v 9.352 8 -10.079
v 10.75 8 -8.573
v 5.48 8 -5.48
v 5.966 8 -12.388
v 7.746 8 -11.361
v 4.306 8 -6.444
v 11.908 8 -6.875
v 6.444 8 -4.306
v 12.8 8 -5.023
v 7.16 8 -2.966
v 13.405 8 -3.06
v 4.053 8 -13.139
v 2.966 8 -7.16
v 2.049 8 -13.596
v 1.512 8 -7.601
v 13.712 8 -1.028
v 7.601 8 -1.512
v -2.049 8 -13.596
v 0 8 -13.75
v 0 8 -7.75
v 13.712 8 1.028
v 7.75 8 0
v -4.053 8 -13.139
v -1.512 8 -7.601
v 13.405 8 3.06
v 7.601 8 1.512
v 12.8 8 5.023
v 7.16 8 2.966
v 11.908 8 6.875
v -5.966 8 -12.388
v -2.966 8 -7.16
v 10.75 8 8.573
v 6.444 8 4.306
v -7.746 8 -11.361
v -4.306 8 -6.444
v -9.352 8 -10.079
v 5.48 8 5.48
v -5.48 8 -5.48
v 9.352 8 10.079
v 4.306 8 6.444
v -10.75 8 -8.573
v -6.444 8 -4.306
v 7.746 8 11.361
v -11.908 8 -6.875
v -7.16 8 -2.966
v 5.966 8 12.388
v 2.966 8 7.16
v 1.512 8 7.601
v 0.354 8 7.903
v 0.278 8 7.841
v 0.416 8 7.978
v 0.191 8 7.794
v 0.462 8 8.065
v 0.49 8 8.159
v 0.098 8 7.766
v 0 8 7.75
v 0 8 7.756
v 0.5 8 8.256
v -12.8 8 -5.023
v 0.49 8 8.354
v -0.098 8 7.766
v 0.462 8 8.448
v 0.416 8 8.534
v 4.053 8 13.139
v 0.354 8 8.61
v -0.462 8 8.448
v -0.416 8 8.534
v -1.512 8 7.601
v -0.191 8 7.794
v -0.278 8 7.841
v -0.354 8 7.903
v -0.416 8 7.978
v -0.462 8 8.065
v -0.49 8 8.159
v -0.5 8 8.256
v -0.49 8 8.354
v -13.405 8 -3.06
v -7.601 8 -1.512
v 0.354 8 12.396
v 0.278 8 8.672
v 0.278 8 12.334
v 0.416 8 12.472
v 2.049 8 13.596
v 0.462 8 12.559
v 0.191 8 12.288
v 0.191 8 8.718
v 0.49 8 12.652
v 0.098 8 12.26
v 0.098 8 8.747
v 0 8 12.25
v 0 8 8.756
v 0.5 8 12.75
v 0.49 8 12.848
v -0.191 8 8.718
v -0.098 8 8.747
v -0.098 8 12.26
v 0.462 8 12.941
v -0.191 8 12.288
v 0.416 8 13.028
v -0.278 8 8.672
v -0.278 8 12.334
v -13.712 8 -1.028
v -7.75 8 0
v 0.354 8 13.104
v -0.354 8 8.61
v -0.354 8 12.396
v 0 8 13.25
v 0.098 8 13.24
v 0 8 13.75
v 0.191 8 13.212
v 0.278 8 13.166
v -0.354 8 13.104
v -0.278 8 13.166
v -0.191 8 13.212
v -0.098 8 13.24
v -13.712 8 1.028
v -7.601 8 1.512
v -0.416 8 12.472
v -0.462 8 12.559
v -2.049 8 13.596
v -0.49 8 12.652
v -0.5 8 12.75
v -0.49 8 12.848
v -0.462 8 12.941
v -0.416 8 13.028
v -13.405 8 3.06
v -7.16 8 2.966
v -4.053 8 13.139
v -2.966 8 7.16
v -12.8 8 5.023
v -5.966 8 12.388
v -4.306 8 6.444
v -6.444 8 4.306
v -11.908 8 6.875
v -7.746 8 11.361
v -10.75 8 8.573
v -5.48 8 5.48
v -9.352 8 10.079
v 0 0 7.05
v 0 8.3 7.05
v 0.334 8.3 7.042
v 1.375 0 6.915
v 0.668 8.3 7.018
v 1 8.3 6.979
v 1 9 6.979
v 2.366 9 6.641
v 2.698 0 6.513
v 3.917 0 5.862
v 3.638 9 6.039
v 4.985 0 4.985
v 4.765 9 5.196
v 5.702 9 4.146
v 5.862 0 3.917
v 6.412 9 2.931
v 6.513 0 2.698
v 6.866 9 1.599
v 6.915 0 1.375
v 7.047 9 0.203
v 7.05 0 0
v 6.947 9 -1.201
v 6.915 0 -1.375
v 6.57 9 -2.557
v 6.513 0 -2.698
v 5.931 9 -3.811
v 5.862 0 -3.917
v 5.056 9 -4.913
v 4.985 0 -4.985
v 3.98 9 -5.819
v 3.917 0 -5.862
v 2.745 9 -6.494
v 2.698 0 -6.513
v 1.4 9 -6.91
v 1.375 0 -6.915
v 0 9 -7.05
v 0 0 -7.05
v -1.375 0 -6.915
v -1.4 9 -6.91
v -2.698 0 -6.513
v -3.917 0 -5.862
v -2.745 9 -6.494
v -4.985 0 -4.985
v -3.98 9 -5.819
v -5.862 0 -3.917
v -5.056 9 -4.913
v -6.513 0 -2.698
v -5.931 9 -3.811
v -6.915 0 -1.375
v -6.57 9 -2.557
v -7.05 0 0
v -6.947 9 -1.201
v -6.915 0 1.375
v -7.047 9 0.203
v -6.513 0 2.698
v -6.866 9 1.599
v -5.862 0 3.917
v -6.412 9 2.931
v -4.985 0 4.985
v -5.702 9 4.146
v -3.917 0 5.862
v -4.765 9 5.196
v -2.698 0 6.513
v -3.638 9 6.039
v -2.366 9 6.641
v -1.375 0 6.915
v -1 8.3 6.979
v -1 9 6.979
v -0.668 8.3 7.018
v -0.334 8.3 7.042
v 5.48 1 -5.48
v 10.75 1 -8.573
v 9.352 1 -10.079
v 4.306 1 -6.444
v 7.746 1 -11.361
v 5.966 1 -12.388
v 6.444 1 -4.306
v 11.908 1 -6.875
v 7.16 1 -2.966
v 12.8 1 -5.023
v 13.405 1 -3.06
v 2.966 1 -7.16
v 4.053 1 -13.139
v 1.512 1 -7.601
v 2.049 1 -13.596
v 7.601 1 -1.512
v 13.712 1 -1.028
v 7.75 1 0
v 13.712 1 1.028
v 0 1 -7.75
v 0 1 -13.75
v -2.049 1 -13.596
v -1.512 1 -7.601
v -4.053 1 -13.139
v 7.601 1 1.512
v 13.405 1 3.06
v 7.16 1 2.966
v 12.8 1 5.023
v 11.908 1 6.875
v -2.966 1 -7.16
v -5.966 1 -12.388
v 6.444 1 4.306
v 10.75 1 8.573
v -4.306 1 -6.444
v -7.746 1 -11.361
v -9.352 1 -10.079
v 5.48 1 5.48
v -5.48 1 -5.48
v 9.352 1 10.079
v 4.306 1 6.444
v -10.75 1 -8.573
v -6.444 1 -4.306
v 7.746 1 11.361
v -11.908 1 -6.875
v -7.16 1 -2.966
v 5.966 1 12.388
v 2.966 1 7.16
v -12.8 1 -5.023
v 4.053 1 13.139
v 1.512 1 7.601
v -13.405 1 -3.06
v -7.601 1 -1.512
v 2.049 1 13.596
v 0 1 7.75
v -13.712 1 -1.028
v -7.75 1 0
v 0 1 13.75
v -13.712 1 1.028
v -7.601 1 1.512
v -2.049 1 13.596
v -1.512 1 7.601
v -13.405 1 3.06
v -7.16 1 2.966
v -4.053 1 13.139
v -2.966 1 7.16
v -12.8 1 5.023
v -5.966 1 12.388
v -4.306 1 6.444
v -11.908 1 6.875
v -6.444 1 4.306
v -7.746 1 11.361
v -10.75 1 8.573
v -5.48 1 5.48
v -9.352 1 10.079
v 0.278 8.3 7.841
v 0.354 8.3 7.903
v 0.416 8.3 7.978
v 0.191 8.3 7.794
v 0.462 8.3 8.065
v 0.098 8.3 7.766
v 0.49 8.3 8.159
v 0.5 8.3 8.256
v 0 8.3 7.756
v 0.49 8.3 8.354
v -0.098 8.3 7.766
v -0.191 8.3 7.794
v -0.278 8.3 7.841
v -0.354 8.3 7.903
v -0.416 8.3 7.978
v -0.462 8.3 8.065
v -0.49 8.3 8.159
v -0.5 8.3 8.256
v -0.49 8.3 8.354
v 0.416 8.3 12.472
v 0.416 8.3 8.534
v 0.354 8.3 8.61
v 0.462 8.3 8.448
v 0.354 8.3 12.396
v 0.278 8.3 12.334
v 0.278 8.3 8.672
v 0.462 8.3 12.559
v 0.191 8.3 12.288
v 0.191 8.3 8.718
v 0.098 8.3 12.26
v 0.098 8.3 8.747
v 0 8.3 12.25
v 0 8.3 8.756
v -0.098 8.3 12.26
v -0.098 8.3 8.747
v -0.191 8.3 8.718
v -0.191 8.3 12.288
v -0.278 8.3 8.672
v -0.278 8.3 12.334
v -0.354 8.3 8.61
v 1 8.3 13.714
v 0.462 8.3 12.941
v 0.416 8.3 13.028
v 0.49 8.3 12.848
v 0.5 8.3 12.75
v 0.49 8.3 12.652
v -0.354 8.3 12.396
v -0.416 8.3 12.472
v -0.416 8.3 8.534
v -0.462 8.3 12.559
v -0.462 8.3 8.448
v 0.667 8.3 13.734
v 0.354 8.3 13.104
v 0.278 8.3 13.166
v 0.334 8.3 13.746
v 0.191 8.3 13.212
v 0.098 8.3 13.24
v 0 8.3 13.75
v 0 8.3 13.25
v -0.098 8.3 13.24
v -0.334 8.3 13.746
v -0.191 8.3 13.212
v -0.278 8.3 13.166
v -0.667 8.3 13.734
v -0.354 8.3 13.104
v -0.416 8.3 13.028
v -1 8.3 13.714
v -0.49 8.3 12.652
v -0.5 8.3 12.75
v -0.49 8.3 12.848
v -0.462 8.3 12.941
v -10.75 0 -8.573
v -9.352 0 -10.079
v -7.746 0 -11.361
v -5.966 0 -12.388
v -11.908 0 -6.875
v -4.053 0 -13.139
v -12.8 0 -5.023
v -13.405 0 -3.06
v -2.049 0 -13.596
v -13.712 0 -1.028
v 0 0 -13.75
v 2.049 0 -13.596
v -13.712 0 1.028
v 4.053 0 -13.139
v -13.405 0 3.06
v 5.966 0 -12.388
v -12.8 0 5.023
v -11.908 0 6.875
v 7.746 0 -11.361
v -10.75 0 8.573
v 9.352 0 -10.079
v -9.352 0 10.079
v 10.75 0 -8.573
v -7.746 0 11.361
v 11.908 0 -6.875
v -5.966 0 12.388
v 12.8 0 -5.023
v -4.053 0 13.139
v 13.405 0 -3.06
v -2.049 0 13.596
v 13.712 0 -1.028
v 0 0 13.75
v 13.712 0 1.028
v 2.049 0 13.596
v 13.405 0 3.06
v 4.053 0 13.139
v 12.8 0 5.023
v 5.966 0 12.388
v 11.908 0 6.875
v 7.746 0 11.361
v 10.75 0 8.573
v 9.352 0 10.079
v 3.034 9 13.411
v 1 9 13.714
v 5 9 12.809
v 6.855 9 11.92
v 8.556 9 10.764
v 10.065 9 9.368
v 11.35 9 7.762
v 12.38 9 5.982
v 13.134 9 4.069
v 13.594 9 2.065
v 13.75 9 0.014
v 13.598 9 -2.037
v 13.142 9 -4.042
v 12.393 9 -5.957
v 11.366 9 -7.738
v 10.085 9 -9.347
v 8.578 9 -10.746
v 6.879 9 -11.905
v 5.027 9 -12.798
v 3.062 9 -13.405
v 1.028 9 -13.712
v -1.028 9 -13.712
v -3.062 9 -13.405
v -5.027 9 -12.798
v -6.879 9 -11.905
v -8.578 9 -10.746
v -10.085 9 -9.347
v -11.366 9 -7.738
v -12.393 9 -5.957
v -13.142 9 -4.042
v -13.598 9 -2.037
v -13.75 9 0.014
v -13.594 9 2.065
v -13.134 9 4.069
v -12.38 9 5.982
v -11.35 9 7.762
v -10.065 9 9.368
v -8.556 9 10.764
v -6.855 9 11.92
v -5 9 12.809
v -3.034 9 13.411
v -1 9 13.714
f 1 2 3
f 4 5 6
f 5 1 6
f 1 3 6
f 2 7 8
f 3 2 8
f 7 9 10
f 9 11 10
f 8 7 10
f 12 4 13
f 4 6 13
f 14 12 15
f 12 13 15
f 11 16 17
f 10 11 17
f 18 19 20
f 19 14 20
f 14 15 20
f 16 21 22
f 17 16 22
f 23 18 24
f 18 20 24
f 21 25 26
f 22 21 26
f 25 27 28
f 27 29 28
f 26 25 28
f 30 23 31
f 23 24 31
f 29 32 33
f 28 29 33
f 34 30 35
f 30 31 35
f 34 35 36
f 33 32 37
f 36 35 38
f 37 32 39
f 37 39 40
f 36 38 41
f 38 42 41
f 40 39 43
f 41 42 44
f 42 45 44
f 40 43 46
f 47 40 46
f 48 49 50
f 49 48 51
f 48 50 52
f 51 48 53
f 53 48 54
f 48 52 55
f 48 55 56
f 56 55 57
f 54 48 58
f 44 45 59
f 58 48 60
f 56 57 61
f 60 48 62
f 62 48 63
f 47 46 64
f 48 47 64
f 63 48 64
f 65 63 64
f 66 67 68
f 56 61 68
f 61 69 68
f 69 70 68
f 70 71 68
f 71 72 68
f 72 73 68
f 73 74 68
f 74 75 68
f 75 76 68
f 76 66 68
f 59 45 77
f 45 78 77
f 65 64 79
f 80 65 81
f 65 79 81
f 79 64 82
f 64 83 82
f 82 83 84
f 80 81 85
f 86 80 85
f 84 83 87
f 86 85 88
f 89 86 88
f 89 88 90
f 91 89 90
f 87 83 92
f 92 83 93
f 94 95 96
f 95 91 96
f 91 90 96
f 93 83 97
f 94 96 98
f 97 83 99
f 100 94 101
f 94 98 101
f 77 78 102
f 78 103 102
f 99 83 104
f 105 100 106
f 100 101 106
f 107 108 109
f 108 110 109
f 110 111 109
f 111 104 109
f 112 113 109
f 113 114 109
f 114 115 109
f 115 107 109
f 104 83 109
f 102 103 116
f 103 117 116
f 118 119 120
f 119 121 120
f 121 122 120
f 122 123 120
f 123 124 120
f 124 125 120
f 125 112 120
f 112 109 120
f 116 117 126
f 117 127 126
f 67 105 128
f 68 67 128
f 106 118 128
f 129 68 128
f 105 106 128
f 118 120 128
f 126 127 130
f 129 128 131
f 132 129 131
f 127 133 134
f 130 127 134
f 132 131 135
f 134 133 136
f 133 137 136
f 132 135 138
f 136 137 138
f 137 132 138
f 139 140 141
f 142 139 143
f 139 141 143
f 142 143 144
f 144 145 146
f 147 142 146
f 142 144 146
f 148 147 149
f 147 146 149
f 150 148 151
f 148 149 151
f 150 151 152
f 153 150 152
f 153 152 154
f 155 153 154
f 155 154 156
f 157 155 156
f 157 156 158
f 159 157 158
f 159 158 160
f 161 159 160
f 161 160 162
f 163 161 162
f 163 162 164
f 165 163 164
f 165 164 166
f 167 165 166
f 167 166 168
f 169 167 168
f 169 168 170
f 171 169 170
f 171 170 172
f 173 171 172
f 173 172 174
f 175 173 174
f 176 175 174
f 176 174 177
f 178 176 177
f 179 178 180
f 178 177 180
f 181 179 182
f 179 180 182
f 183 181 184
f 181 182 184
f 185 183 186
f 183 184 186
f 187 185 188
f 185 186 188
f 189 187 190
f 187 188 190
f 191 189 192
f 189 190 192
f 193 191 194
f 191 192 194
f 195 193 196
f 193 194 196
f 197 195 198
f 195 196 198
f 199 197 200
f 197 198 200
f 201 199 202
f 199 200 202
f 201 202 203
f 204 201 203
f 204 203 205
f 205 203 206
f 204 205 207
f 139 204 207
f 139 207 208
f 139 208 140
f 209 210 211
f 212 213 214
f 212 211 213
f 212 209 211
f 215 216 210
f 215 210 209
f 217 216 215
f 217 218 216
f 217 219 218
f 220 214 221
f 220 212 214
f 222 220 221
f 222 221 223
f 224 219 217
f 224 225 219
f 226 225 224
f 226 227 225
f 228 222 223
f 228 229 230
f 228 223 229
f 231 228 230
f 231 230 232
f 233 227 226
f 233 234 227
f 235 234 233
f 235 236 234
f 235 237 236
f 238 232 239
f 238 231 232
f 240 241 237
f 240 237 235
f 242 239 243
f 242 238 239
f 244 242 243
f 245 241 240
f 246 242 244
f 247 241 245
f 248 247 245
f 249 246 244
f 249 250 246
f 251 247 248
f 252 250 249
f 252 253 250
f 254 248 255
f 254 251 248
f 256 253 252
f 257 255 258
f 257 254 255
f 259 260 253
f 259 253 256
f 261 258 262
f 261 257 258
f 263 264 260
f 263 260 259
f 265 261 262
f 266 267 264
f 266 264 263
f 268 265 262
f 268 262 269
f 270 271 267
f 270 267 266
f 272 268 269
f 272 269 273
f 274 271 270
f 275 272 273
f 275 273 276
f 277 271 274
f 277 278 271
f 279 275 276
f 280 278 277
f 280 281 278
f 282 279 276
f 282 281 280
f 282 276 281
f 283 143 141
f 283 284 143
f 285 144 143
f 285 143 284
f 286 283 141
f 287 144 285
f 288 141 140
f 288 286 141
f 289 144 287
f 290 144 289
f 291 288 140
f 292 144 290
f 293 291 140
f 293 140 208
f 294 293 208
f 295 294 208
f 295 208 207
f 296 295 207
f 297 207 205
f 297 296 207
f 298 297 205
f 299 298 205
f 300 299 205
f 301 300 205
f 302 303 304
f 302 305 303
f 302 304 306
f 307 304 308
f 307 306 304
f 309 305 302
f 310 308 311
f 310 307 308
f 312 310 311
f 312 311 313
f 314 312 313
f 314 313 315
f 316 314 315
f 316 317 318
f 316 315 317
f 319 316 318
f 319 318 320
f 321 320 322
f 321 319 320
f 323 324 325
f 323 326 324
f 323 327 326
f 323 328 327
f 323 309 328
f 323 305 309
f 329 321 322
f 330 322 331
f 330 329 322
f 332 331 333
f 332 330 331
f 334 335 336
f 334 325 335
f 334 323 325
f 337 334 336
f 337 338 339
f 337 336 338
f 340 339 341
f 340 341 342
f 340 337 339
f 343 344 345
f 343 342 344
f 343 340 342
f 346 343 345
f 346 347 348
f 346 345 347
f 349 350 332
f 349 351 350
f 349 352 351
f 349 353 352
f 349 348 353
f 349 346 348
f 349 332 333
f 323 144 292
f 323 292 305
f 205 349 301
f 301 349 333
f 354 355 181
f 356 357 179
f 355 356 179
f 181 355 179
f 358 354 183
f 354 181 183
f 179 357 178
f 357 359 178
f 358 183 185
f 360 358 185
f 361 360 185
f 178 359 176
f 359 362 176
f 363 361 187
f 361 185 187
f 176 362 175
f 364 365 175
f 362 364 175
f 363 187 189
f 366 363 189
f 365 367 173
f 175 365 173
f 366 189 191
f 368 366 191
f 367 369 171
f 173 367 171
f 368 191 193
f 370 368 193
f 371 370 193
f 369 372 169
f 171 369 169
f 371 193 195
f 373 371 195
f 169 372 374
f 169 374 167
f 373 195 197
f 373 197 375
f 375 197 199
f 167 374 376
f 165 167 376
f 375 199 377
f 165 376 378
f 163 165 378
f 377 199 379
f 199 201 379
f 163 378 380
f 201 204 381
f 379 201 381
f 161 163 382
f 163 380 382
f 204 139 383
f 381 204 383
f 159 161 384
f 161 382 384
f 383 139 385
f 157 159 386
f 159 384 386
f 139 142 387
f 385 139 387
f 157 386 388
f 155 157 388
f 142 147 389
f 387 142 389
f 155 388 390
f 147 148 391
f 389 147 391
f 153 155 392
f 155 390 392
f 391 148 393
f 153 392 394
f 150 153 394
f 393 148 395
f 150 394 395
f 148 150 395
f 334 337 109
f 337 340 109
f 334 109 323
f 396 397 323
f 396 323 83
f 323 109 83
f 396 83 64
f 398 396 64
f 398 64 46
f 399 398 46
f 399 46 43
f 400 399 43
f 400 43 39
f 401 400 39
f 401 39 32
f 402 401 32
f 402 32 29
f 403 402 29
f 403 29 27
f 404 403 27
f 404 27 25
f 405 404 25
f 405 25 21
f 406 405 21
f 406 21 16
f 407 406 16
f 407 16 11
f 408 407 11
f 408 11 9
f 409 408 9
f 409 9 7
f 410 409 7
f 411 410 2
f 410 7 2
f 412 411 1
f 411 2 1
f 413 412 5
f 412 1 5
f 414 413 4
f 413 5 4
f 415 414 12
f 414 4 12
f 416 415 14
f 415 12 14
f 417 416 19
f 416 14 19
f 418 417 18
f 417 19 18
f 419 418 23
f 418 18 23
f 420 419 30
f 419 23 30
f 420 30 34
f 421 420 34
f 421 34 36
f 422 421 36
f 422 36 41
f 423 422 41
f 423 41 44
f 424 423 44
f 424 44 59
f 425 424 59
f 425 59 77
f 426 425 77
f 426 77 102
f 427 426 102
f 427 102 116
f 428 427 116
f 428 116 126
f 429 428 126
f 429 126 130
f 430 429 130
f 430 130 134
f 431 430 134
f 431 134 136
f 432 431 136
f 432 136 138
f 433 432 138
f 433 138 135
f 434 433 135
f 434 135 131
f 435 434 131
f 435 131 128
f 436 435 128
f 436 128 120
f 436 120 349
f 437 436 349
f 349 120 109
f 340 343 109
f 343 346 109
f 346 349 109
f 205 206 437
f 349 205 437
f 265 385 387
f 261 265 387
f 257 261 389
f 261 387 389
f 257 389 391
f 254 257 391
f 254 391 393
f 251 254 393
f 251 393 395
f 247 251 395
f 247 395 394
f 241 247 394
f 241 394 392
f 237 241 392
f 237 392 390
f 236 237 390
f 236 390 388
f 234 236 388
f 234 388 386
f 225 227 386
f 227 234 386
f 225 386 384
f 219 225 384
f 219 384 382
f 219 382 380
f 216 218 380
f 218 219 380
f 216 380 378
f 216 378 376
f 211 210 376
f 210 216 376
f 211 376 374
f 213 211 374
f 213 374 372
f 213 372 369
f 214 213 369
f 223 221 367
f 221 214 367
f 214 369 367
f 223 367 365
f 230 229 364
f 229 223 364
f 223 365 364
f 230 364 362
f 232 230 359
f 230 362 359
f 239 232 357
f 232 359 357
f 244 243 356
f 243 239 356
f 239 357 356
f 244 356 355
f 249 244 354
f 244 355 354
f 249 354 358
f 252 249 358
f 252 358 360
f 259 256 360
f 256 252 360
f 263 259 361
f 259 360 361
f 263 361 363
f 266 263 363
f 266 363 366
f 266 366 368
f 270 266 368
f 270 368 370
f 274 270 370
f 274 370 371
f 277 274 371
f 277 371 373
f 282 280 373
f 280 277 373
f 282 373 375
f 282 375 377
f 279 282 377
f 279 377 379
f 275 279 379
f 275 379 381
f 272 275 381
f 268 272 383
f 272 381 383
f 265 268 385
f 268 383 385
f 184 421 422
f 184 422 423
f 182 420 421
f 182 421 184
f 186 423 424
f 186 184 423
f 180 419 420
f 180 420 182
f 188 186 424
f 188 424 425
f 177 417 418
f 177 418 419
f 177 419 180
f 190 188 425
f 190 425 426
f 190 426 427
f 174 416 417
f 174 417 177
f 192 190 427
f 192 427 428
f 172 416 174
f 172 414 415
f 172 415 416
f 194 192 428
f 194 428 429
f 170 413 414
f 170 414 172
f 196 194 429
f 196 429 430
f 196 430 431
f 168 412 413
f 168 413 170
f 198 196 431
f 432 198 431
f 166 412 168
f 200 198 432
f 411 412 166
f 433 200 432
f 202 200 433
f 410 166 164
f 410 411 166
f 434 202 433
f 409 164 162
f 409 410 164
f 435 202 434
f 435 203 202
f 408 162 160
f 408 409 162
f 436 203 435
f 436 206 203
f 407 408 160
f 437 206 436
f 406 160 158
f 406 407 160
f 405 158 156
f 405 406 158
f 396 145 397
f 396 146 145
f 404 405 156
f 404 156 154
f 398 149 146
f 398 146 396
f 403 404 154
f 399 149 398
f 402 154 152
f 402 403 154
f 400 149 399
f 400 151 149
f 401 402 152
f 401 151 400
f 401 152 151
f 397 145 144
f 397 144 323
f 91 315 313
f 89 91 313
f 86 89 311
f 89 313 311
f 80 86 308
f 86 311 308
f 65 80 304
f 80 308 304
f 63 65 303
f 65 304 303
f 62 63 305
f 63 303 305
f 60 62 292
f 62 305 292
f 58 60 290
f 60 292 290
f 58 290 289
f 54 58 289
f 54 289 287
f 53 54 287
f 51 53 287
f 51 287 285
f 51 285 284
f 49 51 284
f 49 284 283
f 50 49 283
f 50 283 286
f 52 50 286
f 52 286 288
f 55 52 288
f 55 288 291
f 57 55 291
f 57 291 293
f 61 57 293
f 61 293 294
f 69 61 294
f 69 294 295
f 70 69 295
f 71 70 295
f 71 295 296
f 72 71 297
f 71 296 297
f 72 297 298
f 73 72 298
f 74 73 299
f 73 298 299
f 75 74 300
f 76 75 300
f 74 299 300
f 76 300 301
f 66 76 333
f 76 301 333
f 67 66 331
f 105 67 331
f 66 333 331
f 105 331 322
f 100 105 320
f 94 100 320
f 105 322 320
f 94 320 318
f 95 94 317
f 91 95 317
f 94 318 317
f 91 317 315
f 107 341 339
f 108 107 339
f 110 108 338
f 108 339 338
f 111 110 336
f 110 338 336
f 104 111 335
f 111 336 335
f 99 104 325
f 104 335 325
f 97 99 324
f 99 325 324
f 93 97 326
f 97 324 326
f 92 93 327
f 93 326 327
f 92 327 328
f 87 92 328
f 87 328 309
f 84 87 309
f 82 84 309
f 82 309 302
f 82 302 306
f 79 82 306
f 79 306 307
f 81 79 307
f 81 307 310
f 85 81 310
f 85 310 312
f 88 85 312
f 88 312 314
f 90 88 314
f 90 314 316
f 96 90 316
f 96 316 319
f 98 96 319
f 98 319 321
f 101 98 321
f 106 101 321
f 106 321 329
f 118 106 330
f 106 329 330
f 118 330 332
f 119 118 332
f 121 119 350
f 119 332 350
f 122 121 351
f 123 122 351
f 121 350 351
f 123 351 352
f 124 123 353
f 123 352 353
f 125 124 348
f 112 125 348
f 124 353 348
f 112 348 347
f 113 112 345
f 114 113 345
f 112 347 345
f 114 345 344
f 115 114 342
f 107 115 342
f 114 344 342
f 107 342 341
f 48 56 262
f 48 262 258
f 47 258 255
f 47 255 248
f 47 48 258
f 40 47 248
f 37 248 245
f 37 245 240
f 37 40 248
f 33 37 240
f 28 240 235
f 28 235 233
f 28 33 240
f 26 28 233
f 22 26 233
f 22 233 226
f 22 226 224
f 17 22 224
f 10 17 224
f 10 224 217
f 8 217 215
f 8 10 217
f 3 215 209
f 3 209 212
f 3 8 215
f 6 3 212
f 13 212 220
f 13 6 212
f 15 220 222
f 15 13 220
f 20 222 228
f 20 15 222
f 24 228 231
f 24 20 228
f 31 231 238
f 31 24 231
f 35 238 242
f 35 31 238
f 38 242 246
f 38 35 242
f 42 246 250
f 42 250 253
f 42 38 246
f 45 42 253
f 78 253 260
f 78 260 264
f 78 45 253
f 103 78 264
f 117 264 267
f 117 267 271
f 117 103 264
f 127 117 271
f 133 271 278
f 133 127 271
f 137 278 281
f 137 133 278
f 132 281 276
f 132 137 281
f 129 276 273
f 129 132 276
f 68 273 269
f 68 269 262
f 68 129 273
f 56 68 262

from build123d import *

# Parameters (mm, degrees)
ESQUISSE1_R             = 13.75
BOSS_EXTRU_1_DEPTH      = 9
ENL_V_START             = -1
ESQUISSE2_OUTSIDE_W     = 37.484
ESQUISSE2_OUTSIDE_H     = 37.484
ESQUISSE2_OUTSIDE_R     = 7.75
ENL_V_MAT_EXTRU_1_DEPTH = 7
ENL_V_MAT_EXTRU_2_REACH = 11
ESQUISSE3_R             = 7.05
ENL_V_MAT_EXTRU_3_REACH = 11
ESQUISSE4_R             = 0.5
ESQUISSE5_W             = 2
ESQUISSE5_H             = 15.584719065
ENL_V_MAT_EXTRU_4_DEPTH = 0.7


with BuildPart() as part:
    # Esquisse1 → Boss.-Extru.1 (new body)
    with BuildSketch(Plane(origin=(0, 0, 0), x_dir=(1, 0, 0), z_dir=(0, 1, 0))):
        with Locations(Location((0, 0, 0), (0, 0, 270))):  # turned: the seam where the file's is
            Circle(ESQUISSE1_R)
    extrude(amount=BOSS_EXTRU_1_DEPTH)

    # Esquisse2 outside → Enlèv. mat.-Extru.1 (cut)
    with BuildSketch(Plane(origin=(0, 9, 0), x_dir=(-1, 0, 0), z_dir=(0, 1, 0)).offset(ENL_V_START)):
        Rectangle(ESQUISSE2_OUTSIDE_W, ESQUISSE2_OUTSIDE_H)
        with Locations(Location((0, 0, 0), (0, 0, 90))):  # turned: the seam where the file's is
            Circle(ESQUISSE2_OUTSIDE_R, mode=Mode.SUBTRACT)
    extrude(amount=-ENL_V_MAT_EXTRU_1_DEPTH, mode=Mode.SUBTRACT)

    # Esquisse3 → Enlèv. mat.-Extru.2 (cut, up to next)
    with BuildSketch(Plane(origin=(0, 9, 0), x_dir=(-1, 0, 0), z_dir=(0, 1, 0)), mode=Mode.PRIVATE) as enl_v_mat_extru_2_sk1:
        with Locations(Location((0, 0, 0), (0, 0, 90))):  # turned: the seam where the file's is
            Circle(ESQUISSE3_R)
    enl_v_mat_extru_2_tool1 = extrude(enl_v_mat_extru_2_sk1.sketch, amount=-ENL_V_MAT_EXTRU_2_REACH, mode=Mode.PRIVATE) & part.part
    add(enl_v_mat_extru_2_tool1.solids().sort_by_distance((0, 9, 0))[0], mode=Mode.SUBTRACT)

    # Esquisse4 → Enlèv. mat.-Extru.3 (cut, up to next)
    with BuildSketch(Plane(origin=(0, 9, 0), x_dir=(-1, 0, 0), z_dir=(0, 1, 0)), mode=Mode.PRIVATE) as enl_v_mat_extru_3_sk1:
        with Locations(Location((0, 8.256283794, 0), (0, 0, 90))):  # turned: the seam where the file's is
            Circle(ESQUISSE4_R)
    enl_v_mat_extru_3_tool1 = extrude(enl_v_mat_extru_3_sk1.sketch, amount=-ENL_V_MAT_EXTRU_3_REACH, mode=Mode.PRIVATE) & part.part
    add(enl_v_mat_extru_3_tool1.solids().sort_by_distance((0, 9, 8.256284))[0], mode=Mode.SUBTRACT)
    # Esquisse4 → Enlèv. mat.-Extru.3 (cut, up to next)
    with BuildSketch(Plane(origin=(0, 9, 0), x_dir=(-1, 0, 0), z_dir=(0, 1, 0)), mode=Mode.PRIVATE) as enl_v_mat_extru_3_sk2:
        with Locations(Location((0, 12.75, 0), (0, 0, 90))):  # turned: the seam where the file's is
            Circle(ESQUISSE4_R)
    enl_v_mat_extru_3_tool2 = extrude(enl_v_mat_extru_3_sk2.sketch, amount=-ENL_V_MAT_EXTRU_3_REACH, mode=Mode.PRIVATE) & part.part
    add(enl_v_mat_extru_3_tool2.solids().sort_by_distance((0, 9, 12.75))[0], mode=Mode.SUBTRACT)

    # Esquisse5 → Enlèv. mat.-Extru.4 (cut)
    with BuildSketch(Plane(origin=(0, 9, 0), x_dir=(-1, 0, 0), z_dir=(0, 1, 0))):
        with Locations((0, 7.792359533)):
            Rectangle(ESQUISSE5_W, ESQUISSE5_H)
    extrude(amount=-ENL_V_MAT_EXTRU_4_DEPTH, mode=Mode.SUBTRACT)


solid = part.part
